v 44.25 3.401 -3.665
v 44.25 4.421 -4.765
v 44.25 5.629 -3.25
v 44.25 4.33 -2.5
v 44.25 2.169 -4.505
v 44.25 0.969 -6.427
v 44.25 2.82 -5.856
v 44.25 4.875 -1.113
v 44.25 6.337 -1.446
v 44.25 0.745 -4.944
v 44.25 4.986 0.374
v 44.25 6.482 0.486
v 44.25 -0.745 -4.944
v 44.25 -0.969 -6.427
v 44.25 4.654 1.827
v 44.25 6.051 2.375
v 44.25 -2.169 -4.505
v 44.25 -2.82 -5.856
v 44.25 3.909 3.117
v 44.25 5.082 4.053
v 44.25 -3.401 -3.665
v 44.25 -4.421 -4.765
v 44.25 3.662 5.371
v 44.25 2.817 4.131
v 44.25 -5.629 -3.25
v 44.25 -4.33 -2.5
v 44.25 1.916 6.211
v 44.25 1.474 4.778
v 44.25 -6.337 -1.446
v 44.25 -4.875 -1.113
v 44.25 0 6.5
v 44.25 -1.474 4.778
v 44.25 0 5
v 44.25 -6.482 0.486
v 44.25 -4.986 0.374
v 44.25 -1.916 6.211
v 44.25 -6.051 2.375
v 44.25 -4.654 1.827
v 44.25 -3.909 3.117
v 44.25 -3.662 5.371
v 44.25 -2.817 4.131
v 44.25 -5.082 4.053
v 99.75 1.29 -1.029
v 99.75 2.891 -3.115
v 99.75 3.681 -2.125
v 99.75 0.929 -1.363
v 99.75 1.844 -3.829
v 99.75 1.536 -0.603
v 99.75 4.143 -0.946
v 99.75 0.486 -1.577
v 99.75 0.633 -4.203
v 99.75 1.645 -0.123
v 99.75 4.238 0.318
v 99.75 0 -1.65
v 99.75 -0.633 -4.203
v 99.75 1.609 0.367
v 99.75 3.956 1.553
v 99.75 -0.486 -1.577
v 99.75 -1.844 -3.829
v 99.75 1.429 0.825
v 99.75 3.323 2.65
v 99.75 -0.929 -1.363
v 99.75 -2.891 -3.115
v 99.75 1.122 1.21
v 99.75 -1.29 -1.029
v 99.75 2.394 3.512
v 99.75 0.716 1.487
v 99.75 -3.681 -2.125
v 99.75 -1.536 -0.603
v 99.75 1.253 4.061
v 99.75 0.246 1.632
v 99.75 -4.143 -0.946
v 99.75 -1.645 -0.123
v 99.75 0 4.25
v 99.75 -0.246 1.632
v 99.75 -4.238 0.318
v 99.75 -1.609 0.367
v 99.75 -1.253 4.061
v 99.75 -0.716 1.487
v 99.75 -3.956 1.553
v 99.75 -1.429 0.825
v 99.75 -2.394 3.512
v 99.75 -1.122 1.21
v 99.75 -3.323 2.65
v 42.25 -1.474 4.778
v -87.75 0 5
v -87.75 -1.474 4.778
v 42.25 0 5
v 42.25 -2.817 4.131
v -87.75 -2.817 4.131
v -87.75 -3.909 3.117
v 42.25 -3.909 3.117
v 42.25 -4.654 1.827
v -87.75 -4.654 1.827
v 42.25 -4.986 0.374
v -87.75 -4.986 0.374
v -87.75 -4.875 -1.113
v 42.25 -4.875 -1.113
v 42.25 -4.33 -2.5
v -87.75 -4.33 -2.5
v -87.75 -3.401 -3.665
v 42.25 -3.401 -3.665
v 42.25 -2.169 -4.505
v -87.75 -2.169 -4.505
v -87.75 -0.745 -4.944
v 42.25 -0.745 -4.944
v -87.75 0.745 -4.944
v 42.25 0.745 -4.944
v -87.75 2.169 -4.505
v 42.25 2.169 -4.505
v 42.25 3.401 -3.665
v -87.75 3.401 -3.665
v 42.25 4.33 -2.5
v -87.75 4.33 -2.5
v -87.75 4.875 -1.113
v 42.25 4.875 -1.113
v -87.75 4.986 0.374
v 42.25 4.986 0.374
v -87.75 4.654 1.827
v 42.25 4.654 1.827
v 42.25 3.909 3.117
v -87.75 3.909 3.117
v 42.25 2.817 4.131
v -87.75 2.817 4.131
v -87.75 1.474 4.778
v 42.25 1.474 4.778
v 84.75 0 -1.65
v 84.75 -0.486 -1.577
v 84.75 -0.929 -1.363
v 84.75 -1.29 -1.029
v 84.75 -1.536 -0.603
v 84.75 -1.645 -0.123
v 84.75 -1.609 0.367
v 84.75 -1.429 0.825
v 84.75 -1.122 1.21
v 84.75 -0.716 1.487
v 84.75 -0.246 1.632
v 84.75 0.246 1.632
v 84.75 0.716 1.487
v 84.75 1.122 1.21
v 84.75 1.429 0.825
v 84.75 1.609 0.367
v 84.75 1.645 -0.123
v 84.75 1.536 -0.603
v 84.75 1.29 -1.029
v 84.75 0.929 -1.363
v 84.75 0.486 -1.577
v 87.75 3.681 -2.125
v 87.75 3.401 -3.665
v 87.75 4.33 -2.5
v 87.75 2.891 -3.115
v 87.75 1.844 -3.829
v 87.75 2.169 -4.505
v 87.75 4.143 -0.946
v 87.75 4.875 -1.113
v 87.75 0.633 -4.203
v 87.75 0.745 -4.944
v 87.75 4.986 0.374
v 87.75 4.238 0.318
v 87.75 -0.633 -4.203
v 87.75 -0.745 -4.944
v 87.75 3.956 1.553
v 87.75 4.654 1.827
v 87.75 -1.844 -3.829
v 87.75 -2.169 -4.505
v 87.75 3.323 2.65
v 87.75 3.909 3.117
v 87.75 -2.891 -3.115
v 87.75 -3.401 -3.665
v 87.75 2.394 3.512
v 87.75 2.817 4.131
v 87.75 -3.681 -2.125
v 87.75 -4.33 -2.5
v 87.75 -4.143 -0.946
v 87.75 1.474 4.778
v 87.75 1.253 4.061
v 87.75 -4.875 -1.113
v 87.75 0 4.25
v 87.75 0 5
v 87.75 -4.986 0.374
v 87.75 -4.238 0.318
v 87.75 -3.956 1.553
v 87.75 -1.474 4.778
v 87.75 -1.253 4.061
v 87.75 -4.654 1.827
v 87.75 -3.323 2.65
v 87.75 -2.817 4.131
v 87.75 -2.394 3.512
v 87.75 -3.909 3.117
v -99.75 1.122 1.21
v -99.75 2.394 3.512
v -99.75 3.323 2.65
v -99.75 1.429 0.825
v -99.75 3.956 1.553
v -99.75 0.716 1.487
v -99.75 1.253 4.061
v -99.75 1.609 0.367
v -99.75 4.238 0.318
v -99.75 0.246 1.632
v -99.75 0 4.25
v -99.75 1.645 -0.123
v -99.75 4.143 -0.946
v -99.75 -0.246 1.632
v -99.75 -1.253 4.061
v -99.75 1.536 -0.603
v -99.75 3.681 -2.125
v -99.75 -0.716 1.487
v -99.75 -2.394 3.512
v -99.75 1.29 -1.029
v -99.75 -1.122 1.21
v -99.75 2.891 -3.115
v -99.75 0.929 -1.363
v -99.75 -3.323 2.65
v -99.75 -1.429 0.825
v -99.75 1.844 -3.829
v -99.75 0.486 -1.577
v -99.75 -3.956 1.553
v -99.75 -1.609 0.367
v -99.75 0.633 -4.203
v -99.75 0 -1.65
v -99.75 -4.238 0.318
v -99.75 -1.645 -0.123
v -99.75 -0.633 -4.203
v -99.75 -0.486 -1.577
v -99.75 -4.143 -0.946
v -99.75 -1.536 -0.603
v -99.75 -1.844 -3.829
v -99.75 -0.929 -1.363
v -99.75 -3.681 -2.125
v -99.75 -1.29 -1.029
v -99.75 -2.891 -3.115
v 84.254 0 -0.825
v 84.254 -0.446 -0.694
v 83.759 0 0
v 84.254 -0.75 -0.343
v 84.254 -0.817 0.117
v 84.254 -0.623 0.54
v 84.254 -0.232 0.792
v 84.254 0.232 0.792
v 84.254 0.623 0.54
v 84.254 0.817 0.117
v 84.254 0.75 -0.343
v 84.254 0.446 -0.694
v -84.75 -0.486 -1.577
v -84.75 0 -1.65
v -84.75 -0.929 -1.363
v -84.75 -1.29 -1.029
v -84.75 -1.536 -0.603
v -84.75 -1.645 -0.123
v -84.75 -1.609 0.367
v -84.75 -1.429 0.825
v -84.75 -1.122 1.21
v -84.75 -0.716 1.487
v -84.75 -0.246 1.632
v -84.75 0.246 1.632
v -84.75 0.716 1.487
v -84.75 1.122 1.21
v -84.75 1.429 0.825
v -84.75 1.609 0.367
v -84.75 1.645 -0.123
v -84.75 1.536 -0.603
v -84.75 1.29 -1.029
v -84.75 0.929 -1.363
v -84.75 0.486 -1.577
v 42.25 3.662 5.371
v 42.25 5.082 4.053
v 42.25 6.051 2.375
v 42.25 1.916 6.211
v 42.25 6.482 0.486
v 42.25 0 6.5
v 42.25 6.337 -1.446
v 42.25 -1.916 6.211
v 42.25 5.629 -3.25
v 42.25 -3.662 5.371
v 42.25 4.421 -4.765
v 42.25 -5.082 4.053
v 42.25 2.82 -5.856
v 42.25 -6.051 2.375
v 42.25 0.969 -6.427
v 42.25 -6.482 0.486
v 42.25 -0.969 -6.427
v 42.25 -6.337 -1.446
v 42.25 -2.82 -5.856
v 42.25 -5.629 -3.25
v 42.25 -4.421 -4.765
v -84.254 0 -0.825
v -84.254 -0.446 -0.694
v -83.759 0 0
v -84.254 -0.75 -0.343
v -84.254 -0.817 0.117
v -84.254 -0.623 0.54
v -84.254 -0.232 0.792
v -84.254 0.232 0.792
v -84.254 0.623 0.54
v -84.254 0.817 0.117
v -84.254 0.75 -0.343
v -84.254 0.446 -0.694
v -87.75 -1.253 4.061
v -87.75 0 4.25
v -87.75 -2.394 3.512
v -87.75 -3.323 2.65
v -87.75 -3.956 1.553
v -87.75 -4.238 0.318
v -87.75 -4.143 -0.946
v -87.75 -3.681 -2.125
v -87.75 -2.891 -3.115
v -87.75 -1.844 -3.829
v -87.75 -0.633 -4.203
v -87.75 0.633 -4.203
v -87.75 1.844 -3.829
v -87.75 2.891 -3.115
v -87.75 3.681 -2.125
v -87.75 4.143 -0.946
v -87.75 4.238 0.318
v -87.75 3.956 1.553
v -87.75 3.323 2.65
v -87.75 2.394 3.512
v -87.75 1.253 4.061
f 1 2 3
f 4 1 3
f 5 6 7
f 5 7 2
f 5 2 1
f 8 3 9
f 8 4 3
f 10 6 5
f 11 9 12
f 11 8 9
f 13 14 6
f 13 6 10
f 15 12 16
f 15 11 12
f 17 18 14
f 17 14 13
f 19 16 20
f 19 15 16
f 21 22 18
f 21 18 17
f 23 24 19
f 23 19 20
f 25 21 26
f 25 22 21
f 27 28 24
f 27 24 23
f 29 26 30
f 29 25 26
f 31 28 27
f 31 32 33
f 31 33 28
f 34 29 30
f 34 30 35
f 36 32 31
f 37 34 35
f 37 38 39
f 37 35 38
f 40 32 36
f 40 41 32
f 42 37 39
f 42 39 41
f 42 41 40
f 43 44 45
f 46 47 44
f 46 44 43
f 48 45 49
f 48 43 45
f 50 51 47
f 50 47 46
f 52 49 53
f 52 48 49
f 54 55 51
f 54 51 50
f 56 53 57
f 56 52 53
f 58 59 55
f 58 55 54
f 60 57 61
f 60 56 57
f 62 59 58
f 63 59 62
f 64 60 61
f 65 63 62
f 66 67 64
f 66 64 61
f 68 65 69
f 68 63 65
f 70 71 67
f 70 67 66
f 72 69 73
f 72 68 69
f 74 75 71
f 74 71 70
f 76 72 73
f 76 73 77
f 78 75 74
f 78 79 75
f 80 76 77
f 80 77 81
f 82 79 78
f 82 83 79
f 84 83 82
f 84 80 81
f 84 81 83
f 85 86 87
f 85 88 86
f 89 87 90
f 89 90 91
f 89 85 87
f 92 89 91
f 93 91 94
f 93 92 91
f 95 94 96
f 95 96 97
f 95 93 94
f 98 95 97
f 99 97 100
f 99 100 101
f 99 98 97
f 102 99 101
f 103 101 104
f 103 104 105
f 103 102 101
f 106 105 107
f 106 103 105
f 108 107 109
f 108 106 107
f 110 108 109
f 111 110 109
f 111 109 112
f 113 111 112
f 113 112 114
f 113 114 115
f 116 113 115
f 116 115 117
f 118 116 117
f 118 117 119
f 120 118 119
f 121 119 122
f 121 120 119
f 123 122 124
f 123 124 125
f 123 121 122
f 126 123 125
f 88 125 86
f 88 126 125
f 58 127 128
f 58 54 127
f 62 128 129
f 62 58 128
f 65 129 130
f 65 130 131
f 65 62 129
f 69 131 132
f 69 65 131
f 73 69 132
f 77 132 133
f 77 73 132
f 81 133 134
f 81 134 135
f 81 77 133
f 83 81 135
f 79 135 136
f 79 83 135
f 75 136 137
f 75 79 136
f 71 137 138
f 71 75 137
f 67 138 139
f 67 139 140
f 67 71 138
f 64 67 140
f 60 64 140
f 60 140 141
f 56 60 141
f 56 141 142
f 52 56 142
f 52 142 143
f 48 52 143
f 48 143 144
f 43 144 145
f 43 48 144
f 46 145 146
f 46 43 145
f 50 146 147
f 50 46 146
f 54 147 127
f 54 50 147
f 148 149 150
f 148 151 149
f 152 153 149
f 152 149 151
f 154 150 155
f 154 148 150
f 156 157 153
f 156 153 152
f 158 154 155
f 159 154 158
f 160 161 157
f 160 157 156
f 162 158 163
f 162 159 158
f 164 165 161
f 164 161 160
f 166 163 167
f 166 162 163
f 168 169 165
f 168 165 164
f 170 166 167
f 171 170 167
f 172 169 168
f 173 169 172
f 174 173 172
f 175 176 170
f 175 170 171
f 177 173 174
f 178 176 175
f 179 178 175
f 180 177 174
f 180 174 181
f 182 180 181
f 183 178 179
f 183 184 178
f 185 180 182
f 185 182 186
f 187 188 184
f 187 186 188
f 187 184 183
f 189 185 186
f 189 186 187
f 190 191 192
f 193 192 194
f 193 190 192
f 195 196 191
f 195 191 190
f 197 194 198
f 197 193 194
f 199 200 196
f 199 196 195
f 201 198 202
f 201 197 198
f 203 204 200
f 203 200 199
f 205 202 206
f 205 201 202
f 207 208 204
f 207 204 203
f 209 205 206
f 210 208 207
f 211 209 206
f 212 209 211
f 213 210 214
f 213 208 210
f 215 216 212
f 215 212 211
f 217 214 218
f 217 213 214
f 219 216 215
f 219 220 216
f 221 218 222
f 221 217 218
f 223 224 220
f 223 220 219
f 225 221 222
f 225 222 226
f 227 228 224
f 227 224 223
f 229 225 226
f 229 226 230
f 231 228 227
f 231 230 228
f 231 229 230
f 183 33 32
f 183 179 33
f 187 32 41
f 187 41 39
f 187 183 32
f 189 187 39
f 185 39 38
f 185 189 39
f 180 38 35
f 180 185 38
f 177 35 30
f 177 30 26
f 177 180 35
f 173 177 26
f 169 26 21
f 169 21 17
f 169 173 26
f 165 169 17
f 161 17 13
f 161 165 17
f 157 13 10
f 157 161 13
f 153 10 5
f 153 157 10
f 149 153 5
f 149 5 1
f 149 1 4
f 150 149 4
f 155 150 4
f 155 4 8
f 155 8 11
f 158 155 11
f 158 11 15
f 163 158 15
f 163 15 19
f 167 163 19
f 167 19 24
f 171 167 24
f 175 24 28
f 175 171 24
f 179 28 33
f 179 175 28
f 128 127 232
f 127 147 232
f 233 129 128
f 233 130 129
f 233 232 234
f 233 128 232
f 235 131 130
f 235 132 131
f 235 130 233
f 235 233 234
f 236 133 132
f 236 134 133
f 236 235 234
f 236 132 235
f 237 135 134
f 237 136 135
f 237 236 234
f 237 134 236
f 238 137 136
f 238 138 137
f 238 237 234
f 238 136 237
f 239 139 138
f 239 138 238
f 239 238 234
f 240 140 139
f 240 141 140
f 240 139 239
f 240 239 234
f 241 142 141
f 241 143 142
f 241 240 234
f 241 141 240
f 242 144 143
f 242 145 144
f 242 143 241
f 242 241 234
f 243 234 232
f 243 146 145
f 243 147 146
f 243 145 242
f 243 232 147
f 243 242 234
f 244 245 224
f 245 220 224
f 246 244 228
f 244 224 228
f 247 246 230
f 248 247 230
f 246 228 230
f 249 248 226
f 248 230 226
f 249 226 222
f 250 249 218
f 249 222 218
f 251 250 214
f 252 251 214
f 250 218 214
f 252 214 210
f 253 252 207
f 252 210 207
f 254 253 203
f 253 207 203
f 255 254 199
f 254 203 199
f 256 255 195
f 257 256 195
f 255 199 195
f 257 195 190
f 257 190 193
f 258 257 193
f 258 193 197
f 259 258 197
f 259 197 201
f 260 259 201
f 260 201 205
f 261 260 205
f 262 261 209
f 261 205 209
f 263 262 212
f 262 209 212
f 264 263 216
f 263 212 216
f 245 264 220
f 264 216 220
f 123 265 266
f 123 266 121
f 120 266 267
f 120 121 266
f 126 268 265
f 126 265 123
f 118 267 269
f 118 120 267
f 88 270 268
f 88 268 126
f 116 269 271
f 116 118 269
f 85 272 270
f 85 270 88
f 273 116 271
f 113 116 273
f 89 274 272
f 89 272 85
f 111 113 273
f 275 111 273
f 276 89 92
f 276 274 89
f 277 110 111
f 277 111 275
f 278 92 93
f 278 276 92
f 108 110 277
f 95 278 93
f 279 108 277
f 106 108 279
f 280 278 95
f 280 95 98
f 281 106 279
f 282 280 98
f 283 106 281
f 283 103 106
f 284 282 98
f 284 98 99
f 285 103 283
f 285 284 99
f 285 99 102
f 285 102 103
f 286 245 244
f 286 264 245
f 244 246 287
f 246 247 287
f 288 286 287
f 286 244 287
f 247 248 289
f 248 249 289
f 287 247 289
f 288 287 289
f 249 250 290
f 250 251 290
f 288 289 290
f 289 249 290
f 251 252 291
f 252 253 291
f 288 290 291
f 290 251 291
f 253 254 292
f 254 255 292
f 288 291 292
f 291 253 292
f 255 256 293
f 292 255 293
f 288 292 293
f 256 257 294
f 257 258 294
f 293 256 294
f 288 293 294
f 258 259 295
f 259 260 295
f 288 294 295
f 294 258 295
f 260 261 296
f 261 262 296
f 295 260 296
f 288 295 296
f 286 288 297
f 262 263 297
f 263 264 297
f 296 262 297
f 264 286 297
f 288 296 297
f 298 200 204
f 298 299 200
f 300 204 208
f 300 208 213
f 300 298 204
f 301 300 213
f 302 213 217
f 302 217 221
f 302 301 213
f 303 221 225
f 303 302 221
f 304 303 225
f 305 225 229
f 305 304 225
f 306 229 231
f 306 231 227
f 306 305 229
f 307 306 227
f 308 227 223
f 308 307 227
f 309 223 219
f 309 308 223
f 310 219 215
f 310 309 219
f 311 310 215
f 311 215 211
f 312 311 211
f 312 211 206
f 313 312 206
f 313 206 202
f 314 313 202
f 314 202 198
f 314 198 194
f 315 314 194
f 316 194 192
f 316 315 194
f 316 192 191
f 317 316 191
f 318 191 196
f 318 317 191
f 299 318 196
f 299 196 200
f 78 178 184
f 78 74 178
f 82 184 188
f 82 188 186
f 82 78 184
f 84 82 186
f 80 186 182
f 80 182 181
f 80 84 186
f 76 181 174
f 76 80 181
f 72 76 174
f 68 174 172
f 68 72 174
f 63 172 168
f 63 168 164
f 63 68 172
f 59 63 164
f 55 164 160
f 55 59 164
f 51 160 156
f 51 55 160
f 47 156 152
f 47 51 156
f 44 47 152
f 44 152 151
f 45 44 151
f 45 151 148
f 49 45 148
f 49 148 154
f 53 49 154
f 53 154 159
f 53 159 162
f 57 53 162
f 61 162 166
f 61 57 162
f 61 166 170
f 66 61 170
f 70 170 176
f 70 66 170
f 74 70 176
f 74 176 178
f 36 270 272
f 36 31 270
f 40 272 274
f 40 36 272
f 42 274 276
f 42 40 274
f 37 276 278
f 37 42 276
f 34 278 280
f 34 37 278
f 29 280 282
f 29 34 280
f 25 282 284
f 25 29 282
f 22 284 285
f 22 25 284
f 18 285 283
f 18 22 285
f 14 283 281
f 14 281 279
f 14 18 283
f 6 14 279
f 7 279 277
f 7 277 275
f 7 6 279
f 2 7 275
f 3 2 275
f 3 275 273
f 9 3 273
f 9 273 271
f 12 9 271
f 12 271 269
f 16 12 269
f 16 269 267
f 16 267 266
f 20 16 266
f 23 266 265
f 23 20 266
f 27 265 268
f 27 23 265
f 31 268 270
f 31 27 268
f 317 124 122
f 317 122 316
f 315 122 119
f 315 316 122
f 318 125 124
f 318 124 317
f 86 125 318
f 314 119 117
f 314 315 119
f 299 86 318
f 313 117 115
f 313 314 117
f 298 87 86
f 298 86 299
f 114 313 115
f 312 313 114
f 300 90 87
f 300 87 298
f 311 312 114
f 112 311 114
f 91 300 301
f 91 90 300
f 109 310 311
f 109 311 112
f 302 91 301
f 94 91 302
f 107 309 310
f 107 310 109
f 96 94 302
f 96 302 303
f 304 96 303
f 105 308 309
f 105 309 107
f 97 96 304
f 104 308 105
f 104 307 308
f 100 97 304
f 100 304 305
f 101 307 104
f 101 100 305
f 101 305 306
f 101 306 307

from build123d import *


with BuildPart() as part:
    # Sketch2 → Revolve1 (revolve)
    with BuildSketch(Plane(origin=(0, 0, 0), x_dir=(1, 0, 0), z_dir=(0, 1, 0)), mode=Mode.PRIVATE) as revolve1_sk:
        Polygon((-99.75, 4.25), (-87.75, 4.25), (-87.75, 5), (42.25, 5), (42.25, 6.5), (44.25, 6.5), (44.25, 5), (87.75, 5), (87.75, 4.25), (99.75, 4.25), (99.75, 0), (-99.75, 0), align=None)
    revolve(revolve1_sk.sketch.rotate(Axis((-69.609903496, 0, 0), (1, 0, 0)), 180), axis=Axis((-69.609903496, 0, 0), (1, 0, 0)))

    # Sketch5 → M4x0.7 Tapped Hole1 (revolve, cut)
    with BuildSketch(Plane(origin=(99.75, 0, 0), x_dir=(0, 0, -1), z_dir=(0, 1, 0))):
        Polygon((0, 0), (0, 15.991420021), (1.65, 15), (1.65, 0), align=None)
    m4x0_7_tapped_hole1 = revolve(axis=Axis((106.1, 0, 0), (-1, 0, 0)), mode=Mode.SUBTRACT)

    # Mirror1: M4x0.7 Tapped Hole1 across plane
    add(m4x0_7_tapped_hole1.mirror(Plane(origin=(0, 0, 0), x_dir=(0, 0, 1), z_dir=(1, 0, 0))), mode=Mode.SUBTRACT)


solid = part.part
